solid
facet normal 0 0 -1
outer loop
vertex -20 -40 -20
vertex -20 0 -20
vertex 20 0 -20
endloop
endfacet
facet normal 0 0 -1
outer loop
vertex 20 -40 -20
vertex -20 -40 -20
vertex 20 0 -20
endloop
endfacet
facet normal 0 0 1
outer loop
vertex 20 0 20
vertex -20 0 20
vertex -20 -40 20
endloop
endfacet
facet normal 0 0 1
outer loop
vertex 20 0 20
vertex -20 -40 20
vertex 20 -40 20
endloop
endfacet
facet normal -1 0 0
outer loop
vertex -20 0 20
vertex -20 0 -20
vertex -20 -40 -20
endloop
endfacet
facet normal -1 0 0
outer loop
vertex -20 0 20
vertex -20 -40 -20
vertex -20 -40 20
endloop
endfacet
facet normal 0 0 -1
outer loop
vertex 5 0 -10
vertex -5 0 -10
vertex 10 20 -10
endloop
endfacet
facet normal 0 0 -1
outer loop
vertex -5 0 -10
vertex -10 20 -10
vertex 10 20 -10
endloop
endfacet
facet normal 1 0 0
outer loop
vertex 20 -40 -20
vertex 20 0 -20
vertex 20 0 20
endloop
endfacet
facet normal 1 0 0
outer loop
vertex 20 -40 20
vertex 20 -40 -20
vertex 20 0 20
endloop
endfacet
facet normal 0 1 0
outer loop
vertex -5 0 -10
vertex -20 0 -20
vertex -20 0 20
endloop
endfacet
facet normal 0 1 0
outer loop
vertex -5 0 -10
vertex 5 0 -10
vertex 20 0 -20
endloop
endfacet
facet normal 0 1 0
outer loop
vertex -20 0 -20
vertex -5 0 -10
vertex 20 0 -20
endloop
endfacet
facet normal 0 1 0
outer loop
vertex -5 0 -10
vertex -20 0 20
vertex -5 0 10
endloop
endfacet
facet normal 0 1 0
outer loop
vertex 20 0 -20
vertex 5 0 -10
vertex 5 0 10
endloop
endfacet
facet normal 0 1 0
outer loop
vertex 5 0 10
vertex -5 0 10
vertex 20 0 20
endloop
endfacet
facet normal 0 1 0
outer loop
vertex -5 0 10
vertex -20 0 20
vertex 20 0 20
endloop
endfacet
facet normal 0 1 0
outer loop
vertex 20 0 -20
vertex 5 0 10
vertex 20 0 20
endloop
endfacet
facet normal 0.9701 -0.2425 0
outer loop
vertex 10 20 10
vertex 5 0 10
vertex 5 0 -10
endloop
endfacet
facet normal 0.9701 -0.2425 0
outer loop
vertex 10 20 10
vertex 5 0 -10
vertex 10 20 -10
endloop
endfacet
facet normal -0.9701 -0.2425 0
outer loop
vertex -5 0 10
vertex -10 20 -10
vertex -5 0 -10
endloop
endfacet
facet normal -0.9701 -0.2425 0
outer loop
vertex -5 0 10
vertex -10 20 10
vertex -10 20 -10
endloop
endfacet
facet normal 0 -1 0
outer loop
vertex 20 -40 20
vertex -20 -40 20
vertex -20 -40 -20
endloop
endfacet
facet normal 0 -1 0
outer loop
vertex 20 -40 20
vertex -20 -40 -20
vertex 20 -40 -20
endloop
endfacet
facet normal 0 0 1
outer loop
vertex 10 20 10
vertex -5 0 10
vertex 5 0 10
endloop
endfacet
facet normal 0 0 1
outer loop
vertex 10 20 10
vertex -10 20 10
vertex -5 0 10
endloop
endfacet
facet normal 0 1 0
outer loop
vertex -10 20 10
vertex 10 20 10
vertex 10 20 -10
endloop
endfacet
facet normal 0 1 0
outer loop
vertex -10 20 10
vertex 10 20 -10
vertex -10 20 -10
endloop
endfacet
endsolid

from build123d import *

# Parameters (mm, degrees)
F0_W     = 40
F0_H     = 40
F1_DEPTH = 40
F3_DEPTH = 10


with BuildPart() as f1:
    # F0 (on Front) → F1 (new body)
    with BuildSketch(Plane.XZ):
        Rectangle(F0_W, F0_H)
    extrude(amount=F1_DEPTH)

    # F2 (on Top) → F3 (join, symmetric)
    with BuildSketch(Plane.XY):
        Polygon((-5, 0), (5, 0), (10, 20), (-10, 20), align=None)
    extrude(amount=F3_DEPTH, both=True)


solid = f1.part
